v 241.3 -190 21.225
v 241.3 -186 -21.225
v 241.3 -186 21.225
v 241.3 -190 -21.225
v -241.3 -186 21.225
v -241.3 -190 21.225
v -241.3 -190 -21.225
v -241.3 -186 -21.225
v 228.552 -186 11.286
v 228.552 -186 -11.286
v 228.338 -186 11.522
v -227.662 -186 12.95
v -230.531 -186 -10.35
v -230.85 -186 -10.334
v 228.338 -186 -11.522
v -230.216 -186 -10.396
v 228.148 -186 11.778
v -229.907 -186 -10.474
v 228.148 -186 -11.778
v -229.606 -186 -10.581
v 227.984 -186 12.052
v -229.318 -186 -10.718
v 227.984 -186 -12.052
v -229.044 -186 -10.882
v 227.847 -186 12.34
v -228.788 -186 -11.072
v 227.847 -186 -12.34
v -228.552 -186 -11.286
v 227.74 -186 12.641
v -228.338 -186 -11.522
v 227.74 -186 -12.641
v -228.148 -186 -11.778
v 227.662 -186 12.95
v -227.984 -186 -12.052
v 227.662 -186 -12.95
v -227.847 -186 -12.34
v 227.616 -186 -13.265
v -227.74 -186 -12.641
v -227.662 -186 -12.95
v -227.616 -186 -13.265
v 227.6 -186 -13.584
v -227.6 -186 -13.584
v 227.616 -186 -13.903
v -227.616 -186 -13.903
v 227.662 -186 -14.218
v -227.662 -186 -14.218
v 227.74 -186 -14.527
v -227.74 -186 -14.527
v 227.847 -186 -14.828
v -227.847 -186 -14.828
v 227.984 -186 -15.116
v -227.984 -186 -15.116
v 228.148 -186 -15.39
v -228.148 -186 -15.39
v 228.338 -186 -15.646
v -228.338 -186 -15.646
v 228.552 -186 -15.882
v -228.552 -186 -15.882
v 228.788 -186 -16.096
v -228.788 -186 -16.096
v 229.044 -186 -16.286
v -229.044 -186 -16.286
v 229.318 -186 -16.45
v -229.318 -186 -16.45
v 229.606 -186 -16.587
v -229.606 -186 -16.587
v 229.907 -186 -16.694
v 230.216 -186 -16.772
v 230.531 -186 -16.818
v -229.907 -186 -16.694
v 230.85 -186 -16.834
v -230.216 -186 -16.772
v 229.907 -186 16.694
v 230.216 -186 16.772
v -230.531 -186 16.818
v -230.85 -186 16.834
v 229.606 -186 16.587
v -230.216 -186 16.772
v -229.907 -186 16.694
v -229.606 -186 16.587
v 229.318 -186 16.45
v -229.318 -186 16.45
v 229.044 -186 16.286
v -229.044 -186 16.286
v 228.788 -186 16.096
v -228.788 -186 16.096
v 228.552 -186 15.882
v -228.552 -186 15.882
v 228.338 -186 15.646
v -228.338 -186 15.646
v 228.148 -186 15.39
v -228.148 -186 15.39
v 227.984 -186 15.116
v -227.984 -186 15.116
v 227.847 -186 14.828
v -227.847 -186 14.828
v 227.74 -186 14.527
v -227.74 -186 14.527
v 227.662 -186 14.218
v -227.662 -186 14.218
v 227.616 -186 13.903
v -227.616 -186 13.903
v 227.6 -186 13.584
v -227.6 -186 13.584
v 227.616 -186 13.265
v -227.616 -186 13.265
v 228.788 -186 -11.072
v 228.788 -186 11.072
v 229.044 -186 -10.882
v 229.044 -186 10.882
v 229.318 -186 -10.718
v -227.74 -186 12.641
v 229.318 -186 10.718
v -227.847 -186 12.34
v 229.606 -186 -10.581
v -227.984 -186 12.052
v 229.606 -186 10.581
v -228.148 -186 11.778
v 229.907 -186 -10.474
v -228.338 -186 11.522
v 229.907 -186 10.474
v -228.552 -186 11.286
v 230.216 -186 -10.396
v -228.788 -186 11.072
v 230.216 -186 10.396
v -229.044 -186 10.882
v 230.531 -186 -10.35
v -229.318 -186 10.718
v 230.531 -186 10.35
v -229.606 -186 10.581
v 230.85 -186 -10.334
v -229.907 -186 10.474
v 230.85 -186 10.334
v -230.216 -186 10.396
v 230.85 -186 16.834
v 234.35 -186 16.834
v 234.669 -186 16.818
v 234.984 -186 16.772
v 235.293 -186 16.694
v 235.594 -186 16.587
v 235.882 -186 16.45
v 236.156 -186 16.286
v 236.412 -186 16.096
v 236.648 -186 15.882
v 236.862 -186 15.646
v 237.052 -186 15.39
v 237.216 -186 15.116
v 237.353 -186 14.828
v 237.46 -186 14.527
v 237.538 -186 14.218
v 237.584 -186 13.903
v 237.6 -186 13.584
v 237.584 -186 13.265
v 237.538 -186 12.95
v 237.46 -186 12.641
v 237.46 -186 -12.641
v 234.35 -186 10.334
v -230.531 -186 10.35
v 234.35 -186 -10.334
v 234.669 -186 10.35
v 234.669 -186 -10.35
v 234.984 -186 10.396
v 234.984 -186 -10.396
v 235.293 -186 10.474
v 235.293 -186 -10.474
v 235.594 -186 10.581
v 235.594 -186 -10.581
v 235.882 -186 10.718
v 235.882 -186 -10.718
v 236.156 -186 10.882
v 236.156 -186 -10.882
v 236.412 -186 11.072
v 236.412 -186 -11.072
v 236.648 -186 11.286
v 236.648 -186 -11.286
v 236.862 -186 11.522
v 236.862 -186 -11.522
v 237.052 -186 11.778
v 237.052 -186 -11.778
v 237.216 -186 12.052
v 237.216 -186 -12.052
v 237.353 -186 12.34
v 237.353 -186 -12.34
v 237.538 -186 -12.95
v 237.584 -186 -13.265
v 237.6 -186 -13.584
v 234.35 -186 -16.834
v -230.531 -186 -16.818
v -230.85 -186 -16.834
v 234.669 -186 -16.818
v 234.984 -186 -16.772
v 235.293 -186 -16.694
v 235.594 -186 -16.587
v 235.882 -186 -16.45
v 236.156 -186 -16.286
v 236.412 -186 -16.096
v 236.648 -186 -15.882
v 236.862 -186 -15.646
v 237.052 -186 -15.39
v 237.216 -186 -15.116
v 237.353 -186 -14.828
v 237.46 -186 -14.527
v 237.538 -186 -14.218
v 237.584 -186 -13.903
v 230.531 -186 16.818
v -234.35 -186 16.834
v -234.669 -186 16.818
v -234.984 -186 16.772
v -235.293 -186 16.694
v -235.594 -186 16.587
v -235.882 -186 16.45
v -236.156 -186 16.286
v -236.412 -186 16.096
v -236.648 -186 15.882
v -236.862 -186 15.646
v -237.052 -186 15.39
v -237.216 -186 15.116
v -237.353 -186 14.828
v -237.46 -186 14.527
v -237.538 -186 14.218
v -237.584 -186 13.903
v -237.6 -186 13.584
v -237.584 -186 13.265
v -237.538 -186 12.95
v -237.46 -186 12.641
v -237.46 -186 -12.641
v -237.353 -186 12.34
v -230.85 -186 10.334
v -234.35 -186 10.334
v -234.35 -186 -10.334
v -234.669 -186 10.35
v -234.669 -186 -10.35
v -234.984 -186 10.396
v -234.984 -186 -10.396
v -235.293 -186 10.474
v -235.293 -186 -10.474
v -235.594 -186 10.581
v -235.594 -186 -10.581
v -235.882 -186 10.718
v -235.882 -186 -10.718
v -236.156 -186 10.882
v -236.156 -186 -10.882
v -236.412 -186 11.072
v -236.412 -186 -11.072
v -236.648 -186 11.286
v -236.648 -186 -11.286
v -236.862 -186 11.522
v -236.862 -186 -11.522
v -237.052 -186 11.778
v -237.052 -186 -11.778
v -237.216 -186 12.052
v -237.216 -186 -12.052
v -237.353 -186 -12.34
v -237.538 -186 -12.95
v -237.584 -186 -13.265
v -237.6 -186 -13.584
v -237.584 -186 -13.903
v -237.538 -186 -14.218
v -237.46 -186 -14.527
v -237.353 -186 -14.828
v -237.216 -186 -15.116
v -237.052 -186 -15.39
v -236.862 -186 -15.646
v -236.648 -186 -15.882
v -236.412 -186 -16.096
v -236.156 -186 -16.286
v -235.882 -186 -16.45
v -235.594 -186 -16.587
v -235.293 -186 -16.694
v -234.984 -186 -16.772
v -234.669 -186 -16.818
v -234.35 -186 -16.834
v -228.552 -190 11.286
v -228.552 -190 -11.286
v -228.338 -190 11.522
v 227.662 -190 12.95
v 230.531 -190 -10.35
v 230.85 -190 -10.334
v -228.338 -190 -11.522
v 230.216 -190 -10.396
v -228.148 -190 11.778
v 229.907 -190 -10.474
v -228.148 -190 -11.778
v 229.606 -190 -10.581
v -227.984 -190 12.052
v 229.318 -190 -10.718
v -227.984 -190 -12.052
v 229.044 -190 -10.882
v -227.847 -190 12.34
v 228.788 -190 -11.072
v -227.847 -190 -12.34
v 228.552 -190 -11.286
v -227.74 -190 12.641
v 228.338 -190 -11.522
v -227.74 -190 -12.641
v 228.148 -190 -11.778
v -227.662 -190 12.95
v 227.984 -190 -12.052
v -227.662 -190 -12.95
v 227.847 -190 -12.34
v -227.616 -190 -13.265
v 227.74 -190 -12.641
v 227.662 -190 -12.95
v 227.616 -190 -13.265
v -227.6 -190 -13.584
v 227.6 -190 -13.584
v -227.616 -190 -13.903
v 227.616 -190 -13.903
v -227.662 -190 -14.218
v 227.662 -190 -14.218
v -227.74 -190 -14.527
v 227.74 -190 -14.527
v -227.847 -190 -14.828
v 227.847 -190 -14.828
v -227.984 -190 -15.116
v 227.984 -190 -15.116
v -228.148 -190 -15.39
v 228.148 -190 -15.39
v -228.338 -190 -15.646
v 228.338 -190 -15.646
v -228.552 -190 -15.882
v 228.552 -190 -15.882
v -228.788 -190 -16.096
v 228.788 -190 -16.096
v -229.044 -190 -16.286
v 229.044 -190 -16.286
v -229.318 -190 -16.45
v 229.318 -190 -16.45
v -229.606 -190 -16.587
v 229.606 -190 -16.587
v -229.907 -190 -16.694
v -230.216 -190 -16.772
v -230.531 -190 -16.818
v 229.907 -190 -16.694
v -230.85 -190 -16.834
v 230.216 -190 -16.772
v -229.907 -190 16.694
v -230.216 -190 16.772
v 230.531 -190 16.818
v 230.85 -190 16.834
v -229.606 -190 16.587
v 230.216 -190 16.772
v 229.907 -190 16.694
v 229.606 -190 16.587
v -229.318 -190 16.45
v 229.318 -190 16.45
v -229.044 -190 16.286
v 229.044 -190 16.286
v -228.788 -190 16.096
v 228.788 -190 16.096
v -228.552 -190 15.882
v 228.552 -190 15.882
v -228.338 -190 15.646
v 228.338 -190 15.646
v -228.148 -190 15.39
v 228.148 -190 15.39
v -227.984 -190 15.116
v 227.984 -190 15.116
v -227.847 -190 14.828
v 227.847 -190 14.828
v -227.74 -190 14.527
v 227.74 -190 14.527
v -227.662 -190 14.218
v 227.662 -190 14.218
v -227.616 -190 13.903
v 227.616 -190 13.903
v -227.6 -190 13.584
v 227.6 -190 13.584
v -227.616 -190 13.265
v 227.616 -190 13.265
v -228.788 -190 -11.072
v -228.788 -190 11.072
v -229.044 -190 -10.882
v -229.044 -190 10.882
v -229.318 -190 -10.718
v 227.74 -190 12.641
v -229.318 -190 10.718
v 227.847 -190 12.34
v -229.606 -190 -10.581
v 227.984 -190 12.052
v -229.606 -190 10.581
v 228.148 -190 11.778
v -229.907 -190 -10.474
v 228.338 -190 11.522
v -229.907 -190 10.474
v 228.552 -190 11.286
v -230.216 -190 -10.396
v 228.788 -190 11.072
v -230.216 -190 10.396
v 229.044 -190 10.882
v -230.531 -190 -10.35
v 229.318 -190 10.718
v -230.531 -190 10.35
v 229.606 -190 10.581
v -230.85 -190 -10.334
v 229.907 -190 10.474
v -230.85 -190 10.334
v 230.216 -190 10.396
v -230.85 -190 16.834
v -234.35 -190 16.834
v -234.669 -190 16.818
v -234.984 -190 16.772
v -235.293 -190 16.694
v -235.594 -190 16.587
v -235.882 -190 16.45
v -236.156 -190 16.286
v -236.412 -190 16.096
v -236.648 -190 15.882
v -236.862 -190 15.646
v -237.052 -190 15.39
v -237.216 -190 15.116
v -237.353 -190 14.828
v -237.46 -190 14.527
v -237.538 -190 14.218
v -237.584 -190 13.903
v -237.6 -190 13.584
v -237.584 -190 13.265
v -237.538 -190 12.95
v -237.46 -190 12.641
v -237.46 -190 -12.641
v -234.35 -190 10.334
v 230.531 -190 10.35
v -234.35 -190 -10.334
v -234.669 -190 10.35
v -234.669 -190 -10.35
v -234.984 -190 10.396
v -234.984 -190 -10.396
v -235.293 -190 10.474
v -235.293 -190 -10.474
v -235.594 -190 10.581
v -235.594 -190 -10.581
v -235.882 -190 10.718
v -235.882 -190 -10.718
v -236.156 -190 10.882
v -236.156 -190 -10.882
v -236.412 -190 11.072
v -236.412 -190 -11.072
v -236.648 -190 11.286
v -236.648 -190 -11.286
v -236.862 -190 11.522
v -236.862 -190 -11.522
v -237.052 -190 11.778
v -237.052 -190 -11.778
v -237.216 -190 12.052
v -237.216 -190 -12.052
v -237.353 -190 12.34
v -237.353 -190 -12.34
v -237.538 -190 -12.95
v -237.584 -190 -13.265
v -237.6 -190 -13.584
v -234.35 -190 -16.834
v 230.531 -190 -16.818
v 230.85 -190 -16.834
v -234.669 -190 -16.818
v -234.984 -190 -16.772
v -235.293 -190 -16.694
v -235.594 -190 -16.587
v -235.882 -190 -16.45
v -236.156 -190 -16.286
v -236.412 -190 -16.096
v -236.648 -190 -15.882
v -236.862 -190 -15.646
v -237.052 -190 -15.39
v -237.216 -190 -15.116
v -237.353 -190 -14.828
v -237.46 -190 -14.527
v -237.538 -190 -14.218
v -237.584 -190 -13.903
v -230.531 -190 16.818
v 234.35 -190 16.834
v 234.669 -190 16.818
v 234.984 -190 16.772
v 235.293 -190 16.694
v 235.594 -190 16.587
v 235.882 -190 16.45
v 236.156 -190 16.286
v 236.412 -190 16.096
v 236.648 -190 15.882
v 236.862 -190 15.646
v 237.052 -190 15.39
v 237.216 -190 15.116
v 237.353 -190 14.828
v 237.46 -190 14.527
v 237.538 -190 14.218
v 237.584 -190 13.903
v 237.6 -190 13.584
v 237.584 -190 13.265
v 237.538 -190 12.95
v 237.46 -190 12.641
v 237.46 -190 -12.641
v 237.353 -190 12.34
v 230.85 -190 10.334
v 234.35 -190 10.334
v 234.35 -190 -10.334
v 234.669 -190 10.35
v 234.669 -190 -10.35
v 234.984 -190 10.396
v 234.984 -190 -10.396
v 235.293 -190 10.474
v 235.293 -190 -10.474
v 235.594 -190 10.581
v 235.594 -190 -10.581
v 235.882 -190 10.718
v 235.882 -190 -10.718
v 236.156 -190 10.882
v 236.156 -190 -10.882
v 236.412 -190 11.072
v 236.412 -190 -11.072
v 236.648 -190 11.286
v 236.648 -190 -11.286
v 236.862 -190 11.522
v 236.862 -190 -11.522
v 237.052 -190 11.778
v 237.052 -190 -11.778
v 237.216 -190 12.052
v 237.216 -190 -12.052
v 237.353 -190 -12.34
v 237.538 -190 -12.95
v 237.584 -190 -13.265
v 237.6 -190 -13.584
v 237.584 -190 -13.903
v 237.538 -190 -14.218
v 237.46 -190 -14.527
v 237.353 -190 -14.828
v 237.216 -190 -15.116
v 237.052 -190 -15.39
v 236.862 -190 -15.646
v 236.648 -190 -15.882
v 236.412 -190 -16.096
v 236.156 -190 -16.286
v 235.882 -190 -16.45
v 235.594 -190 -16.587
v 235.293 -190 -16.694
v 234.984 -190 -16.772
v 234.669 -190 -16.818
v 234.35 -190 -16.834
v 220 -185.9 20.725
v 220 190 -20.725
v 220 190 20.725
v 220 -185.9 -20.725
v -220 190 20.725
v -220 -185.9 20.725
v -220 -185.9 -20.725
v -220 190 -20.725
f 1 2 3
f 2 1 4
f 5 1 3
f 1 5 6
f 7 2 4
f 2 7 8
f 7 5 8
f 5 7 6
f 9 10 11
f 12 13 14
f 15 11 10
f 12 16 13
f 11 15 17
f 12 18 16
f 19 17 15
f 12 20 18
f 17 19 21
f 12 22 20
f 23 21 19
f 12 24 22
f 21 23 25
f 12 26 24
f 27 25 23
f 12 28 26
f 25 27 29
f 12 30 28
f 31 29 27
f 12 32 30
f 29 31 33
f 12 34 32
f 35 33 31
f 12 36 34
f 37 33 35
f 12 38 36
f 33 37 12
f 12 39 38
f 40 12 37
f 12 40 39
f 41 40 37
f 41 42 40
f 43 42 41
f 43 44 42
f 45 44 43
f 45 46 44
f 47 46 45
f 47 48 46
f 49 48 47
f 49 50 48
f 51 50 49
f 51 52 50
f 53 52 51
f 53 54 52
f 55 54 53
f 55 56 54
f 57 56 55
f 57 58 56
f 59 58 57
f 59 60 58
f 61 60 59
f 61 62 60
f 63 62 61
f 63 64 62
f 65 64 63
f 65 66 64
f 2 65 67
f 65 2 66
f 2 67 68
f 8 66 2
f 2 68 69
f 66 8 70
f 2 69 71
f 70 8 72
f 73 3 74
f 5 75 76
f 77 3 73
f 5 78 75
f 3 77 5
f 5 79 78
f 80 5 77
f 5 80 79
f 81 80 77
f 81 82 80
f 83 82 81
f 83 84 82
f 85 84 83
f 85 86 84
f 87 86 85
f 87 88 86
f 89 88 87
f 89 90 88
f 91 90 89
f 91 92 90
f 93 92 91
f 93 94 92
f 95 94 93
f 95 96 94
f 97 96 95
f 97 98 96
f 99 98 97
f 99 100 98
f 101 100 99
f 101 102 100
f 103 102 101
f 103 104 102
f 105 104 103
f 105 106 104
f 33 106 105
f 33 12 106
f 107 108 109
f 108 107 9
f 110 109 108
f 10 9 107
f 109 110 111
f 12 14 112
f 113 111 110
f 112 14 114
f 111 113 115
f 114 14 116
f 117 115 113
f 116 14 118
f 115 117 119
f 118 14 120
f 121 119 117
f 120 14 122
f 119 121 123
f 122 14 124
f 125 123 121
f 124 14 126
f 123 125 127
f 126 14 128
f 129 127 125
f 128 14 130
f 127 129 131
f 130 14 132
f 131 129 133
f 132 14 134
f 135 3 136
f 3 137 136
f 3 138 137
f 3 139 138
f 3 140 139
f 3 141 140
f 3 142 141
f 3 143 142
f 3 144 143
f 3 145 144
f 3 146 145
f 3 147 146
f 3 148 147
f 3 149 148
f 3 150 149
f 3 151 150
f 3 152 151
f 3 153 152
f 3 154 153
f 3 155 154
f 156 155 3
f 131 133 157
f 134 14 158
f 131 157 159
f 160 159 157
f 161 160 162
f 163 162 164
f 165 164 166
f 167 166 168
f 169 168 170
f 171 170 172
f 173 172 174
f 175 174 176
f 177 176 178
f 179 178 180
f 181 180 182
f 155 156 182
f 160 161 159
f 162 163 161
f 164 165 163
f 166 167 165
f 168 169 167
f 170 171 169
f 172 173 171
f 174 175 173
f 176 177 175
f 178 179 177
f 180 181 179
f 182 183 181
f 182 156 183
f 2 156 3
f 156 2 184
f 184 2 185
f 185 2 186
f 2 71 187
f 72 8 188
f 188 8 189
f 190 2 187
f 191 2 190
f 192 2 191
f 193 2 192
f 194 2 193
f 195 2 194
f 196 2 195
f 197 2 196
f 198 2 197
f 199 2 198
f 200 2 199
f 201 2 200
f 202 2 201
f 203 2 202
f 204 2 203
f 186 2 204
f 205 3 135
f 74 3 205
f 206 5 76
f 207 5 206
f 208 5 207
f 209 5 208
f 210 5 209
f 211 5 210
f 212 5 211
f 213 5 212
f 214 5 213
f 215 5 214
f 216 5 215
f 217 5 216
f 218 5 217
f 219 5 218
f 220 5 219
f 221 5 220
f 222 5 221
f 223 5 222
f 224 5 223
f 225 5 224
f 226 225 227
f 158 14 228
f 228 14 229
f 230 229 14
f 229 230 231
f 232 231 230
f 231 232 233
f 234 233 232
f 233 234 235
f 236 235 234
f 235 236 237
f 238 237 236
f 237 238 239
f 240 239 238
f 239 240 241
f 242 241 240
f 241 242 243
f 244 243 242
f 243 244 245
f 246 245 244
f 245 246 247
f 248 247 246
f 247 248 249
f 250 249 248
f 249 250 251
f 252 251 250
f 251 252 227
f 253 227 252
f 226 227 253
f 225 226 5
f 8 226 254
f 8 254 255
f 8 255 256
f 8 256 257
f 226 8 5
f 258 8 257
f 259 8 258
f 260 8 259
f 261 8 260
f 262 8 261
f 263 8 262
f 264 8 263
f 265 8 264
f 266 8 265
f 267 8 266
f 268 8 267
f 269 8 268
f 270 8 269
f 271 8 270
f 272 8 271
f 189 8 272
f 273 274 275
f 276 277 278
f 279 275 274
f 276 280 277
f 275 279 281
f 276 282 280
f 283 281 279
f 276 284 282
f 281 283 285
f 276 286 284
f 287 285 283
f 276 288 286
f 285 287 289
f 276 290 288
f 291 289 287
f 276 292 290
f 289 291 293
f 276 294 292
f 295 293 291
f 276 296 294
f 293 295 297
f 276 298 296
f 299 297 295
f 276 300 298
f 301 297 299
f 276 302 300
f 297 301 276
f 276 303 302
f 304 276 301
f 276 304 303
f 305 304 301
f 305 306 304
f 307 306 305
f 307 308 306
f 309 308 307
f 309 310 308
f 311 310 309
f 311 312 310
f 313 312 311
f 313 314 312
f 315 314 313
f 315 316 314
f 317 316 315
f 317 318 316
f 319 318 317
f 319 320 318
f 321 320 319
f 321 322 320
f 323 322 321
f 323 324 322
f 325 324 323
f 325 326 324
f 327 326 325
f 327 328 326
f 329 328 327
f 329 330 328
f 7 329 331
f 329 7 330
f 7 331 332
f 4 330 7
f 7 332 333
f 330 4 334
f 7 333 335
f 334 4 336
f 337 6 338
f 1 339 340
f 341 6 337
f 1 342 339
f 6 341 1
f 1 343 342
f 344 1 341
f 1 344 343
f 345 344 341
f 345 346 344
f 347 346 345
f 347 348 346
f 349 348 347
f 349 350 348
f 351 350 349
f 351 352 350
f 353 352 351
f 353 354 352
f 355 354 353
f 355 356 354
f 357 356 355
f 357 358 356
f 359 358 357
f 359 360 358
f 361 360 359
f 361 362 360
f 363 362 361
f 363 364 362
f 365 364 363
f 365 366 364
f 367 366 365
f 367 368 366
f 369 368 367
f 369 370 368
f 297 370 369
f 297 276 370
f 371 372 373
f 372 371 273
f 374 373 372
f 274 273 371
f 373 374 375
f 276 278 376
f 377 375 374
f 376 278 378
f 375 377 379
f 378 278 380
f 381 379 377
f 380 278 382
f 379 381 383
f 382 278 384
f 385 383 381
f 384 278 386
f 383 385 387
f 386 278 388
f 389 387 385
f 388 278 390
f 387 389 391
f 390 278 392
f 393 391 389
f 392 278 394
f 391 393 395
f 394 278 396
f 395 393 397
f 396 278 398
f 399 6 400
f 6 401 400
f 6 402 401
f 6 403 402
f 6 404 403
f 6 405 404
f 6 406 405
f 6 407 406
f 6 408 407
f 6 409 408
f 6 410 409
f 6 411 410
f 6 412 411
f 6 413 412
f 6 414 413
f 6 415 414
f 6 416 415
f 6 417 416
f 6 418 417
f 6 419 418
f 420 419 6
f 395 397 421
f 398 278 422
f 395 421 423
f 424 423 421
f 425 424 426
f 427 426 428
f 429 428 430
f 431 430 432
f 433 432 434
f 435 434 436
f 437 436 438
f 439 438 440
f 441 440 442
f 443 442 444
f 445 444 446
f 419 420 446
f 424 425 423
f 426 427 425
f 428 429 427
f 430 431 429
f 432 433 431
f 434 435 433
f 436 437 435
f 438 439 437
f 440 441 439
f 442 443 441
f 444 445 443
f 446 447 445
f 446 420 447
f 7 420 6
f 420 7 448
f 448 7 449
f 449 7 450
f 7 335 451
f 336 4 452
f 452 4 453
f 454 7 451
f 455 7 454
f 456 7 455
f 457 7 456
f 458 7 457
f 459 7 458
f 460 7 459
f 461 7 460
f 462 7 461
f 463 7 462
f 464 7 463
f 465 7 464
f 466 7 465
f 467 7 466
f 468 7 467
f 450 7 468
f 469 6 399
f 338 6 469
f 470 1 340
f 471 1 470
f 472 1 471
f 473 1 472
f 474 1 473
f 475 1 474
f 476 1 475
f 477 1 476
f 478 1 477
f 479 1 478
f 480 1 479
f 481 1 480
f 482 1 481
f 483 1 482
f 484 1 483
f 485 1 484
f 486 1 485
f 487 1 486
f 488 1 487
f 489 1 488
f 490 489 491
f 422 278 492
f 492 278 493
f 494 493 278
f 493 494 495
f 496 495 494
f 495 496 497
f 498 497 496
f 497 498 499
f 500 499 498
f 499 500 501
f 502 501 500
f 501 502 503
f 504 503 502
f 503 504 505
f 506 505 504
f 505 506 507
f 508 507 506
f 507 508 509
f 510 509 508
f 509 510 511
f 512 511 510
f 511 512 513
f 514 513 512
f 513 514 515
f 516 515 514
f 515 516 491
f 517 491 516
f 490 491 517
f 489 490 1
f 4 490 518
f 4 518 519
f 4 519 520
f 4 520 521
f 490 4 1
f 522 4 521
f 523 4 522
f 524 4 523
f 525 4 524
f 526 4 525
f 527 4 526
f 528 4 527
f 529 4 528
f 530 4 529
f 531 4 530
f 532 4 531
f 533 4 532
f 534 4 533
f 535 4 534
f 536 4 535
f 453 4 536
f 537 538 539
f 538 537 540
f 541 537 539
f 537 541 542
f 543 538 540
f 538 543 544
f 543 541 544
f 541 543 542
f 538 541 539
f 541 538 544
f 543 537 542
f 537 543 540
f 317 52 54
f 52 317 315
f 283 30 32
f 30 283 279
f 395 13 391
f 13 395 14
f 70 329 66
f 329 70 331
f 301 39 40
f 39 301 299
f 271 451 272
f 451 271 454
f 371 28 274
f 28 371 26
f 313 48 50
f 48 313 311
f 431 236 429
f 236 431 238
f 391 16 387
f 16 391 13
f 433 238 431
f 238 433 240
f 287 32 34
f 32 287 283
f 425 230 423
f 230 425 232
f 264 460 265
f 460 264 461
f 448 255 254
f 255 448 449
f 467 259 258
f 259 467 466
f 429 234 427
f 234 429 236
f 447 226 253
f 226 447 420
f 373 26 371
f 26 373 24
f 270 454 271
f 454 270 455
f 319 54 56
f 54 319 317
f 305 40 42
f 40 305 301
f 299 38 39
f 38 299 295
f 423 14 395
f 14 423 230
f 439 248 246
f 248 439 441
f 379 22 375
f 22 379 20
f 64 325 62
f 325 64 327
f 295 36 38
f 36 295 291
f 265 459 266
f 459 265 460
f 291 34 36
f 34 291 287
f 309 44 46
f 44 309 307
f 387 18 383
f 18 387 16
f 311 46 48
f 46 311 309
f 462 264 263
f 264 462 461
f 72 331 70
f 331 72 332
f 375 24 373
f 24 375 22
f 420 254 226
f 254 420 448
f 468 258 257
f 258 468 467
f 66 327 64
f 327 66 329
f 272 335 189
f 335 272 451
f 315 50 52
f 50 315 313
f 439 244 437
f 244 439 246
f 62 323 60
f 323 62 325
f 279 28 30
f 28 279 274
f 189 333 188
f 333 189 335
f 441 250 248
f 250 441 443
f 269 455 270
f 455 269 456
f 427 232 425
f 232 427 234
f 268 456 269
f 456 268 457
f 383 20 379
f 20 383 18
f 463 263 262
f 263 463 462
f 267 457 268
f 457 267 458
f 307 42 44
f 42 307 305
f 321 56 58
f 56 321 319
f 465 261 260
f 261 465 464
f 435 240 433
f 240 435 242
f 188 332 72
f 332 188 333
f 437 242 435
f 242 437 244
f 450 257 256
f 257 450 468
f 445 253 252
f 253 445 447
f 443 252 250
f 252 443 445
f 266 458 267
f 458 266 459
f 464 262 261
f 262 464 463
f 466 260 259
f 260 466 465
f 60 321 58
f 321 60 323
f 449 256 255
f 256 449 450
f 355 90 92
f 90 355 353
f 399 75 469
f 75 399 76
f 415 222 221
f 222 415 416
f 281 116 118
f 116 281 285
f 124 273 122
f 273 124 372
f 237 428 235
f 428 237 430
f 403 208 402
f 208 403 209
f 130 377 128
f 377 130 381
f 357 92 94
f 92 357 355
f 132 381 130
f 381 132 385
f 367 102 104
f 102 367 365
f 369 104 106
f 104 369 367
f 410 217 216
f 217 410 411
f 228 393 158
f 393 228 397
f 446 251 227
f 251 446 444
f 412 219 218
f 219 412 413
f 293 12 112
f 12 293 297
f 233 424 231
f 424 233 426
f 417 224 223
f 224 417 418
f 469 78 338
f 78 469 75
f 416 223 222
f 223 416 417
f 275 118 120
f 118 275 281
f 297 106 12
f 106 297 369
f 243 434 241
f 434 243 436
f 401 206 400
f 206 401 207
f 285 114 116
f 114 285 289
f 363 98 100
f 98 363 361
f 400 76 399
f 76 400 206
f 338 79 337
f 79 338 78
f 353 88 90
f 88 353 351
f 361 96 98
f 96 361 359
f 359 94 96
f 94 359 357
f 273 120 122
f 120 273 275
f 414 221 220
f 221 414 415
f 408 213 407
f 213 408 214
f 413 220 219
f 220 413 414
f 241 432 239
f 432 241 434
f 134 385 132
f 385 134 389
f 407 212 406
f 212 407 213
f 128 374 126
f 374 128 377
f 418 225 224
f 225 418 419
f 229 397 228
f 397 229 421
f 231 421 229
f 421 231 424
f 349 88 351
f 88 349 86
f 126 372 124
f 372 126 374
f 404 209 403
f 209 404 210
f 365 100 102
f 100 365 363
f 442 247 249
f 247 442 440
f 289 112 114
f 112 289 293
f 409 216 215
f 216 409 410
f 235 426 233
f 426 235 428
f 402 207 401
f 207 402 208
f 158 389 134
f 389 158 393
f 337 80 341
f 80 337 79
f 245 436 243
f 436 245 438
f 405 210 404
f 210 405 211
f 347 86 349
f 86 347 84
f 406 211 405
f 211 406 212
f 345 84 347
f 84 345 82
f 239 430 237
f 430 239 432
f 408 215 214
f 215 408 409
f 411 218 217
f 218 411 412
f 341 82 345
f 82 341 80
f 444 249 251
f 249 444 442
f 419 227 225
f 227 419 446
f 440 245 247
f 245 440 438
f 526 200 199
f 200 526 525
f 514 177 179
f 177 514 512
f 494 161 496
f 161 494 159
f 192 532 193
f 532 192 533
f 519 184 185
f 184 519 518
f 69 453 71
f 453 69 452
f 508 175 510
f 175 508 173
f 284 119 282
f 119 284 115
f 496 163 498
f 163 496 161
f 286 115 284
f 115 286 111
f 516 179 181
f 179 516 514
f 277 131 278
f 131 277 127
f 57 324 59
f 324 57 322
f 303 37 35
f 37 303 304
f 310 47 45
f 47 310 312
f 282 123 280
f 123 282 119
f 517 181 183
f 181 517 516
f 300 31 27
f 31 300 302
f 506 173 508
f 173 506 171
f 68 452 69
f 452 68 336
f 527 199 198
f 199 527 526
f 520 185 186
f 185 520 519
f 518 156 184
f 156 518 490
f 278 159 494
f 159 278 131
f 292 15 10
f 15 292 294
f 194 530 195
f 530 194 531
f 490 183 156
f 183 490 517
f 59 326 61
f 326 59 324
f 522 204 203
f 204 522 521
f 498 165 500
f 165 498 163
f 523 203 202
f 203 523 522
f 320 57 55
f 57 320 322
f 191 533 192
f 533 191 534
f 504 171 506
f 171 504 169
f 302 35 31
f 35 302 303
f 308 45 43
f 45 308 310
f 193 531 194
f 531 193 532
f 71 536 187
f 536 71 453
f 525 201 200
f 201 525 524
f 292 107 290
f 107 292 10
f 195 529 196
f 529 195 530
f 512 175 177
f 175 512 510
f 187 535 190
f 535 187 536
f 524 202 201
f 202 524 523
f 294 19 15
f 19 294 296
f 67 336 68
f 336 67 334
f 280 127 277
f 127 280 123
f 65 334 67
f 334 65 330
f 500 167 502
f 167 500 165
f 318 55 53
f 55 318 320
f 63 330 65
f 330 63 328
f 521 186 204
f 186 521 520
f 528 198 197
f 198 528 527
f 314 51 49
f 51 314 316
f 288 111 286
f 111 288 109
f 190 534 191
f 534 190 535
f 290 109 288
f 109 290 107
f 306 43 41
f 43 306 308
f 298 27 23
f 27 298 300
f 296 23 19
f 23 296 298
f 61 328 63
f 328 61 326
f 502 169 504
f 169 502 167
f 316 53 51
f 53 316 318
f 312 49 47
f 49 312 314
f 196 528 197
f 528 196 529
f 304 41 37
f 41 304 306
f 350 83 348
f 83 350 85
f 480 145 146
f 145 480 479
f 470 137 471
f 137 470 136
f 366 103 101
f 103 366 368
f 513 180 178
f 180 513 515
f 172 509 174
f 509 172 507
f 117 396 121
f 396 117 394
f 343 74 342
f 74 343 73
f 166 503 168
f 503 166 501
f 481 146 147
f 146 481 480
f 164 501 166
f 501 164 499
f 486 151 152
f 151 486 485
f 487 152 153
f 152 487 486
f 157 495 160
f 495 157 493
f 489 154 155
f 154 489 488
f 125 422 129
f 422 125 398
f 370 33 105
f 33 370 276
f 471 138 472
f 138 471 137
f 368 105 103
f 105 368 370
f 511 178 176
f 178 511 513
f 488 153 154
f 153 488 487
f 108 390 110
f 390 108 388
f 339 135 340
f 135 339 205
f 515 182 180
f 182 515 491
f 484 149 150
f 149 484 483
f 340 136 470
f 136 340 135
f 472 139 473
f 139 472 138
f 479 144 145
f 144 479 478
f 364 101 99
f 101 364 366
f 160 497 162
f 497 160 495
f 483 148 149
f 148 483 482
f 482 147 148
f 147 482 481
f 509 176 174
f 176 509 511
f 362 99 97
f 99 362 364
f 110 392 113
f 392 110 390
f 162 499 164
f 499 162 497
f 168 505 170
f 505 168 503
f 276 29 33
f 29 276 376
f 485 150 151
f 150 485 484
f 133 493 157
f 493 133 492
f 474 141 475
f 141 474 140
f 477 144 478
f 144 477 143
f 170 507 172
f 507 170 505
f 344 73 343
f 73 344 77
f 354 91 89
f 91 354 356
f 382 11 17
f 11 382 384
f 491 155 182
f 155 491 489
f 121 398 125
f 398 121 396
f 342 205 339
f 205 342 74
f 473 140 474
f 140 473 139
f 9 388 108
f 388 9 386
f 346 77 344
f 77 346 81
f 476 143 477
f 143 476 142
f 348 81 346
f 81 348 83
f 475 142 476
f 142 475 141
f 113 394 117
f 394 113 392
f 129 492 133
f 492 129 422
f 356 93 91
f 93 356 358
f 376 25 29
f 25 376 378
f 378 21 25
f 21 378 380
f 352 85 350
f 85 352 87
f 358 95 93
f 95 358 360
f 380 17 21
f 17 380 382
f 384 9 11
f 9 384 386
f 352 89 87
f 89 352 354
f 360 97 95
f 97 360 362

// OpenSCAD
// ============================================================================
// Atom Lithography Machine — Parametric OpenSCAD Module (S6.9-04)
// ============================================================================
// part_id           : S6.9-04
// parent_bom_id     : S6.9
// subsystem         : S6
// part_name         : PT420 doner-vana faz kodlayicisi ve n=1..15 (1.4-21 Hz) 25 dB harmonik feedforward DSP (Exp133)
// material          : Al 6061
// temp_stage        : 300 K (kabin)
// vacuum_grade      : Atmosfer
// tolerance         : ±0.1 deg faz
// computed_mass_kg  : 3.83862
// envelope_mm       : 482.600 x 392.050 x 42.450
// design_maturity   : M0_M1_DETAILED_CAD_DESIGN_ONLY
// no_lab_measurement: true
// iec61508_certified: false
// semi_s2_certified : false
// Units: millimeters (mm)
// ============================================================================

$fn = 64;

// Nominal bounding envelope parameters (mm)
bbox_x = 482.6000;
bbox_y = 392.0500;
bbox_z = 42.4500;

// Part-specific parametric dimensions
rack_u = 1;
u_start = 6;
harmonics_n = 15;
ff_suppression_db = 25.0;

// Interface / port parameters (mm)

module part_S6_9_04() {
  difference() {
    union() {
      // 19" EIA-310 front bezel panel
      translate([0.000, -188.000, 0.000]) cube([482.600, 4.000, 42.450], center=true);
      // Hollow EMI shielded chassis body
      translate([0.000, 2.050, 0.000]) cube([440.000, 375.900, 41.450], center=true);
    }
    // EIA-310 rack ear slot
    translate([-232.600, -188.000, -13.584]) rotate([90.000, 0.000, 0.000]) {
      hull() {
        translate([-1.750, 0, 0]) cylinder(d=6.500, h=6.000, center=true);
        translate([1.750, 0, 0]) cylinder(d=6.500, h=6.000, center=true);
      }
    }
    // EIA-310 rack ear slot
    translate([-232.600, -188.000, 13.584]) rotate([90.000, 0.000, 0.000]) {
      hull() {
        translate([-1.750, 0, 0]) cylinder(d=6.500, h=6.000, center=true);
        translate([1.750, 0, 0]) cylinder(d=6.500, h=6.000, center=true);
      }
    }
    // EIA-310 rack ear slot
    translate([232.600, -188.000, -13.584]) rotate([90.000, 0.000, 0.000]) {
      hull() {
        translate([-1.750, 0, 0]) cylinder(d=6.500, h=6.000, center=true);
        translate([1.750, 0, 0]) cylinder(d=6.500, h=6.000, center=true);
      }
    }
    // EIA-310 rack ear slot
    translate([232.600, -188.000, 13.584]) rotate([90.000, 0.000, 0.000]) {
      hull() {
        translate([-1.750, 0, 0]) cylinder(d=6.500, h=6.000, center=true);
        translate([1.750, 0, 0]) cylinder(d=6.500, h=6.000, center=true);
      }
    }
  }
}

// World assembly mounting transform (global machine frame, mm / deg):
// translate([2100.000, 0.000, 334.475]) rotate([0.000, 0.000, 0.000]) part_S6_9_04();

part_S6_9_04();
